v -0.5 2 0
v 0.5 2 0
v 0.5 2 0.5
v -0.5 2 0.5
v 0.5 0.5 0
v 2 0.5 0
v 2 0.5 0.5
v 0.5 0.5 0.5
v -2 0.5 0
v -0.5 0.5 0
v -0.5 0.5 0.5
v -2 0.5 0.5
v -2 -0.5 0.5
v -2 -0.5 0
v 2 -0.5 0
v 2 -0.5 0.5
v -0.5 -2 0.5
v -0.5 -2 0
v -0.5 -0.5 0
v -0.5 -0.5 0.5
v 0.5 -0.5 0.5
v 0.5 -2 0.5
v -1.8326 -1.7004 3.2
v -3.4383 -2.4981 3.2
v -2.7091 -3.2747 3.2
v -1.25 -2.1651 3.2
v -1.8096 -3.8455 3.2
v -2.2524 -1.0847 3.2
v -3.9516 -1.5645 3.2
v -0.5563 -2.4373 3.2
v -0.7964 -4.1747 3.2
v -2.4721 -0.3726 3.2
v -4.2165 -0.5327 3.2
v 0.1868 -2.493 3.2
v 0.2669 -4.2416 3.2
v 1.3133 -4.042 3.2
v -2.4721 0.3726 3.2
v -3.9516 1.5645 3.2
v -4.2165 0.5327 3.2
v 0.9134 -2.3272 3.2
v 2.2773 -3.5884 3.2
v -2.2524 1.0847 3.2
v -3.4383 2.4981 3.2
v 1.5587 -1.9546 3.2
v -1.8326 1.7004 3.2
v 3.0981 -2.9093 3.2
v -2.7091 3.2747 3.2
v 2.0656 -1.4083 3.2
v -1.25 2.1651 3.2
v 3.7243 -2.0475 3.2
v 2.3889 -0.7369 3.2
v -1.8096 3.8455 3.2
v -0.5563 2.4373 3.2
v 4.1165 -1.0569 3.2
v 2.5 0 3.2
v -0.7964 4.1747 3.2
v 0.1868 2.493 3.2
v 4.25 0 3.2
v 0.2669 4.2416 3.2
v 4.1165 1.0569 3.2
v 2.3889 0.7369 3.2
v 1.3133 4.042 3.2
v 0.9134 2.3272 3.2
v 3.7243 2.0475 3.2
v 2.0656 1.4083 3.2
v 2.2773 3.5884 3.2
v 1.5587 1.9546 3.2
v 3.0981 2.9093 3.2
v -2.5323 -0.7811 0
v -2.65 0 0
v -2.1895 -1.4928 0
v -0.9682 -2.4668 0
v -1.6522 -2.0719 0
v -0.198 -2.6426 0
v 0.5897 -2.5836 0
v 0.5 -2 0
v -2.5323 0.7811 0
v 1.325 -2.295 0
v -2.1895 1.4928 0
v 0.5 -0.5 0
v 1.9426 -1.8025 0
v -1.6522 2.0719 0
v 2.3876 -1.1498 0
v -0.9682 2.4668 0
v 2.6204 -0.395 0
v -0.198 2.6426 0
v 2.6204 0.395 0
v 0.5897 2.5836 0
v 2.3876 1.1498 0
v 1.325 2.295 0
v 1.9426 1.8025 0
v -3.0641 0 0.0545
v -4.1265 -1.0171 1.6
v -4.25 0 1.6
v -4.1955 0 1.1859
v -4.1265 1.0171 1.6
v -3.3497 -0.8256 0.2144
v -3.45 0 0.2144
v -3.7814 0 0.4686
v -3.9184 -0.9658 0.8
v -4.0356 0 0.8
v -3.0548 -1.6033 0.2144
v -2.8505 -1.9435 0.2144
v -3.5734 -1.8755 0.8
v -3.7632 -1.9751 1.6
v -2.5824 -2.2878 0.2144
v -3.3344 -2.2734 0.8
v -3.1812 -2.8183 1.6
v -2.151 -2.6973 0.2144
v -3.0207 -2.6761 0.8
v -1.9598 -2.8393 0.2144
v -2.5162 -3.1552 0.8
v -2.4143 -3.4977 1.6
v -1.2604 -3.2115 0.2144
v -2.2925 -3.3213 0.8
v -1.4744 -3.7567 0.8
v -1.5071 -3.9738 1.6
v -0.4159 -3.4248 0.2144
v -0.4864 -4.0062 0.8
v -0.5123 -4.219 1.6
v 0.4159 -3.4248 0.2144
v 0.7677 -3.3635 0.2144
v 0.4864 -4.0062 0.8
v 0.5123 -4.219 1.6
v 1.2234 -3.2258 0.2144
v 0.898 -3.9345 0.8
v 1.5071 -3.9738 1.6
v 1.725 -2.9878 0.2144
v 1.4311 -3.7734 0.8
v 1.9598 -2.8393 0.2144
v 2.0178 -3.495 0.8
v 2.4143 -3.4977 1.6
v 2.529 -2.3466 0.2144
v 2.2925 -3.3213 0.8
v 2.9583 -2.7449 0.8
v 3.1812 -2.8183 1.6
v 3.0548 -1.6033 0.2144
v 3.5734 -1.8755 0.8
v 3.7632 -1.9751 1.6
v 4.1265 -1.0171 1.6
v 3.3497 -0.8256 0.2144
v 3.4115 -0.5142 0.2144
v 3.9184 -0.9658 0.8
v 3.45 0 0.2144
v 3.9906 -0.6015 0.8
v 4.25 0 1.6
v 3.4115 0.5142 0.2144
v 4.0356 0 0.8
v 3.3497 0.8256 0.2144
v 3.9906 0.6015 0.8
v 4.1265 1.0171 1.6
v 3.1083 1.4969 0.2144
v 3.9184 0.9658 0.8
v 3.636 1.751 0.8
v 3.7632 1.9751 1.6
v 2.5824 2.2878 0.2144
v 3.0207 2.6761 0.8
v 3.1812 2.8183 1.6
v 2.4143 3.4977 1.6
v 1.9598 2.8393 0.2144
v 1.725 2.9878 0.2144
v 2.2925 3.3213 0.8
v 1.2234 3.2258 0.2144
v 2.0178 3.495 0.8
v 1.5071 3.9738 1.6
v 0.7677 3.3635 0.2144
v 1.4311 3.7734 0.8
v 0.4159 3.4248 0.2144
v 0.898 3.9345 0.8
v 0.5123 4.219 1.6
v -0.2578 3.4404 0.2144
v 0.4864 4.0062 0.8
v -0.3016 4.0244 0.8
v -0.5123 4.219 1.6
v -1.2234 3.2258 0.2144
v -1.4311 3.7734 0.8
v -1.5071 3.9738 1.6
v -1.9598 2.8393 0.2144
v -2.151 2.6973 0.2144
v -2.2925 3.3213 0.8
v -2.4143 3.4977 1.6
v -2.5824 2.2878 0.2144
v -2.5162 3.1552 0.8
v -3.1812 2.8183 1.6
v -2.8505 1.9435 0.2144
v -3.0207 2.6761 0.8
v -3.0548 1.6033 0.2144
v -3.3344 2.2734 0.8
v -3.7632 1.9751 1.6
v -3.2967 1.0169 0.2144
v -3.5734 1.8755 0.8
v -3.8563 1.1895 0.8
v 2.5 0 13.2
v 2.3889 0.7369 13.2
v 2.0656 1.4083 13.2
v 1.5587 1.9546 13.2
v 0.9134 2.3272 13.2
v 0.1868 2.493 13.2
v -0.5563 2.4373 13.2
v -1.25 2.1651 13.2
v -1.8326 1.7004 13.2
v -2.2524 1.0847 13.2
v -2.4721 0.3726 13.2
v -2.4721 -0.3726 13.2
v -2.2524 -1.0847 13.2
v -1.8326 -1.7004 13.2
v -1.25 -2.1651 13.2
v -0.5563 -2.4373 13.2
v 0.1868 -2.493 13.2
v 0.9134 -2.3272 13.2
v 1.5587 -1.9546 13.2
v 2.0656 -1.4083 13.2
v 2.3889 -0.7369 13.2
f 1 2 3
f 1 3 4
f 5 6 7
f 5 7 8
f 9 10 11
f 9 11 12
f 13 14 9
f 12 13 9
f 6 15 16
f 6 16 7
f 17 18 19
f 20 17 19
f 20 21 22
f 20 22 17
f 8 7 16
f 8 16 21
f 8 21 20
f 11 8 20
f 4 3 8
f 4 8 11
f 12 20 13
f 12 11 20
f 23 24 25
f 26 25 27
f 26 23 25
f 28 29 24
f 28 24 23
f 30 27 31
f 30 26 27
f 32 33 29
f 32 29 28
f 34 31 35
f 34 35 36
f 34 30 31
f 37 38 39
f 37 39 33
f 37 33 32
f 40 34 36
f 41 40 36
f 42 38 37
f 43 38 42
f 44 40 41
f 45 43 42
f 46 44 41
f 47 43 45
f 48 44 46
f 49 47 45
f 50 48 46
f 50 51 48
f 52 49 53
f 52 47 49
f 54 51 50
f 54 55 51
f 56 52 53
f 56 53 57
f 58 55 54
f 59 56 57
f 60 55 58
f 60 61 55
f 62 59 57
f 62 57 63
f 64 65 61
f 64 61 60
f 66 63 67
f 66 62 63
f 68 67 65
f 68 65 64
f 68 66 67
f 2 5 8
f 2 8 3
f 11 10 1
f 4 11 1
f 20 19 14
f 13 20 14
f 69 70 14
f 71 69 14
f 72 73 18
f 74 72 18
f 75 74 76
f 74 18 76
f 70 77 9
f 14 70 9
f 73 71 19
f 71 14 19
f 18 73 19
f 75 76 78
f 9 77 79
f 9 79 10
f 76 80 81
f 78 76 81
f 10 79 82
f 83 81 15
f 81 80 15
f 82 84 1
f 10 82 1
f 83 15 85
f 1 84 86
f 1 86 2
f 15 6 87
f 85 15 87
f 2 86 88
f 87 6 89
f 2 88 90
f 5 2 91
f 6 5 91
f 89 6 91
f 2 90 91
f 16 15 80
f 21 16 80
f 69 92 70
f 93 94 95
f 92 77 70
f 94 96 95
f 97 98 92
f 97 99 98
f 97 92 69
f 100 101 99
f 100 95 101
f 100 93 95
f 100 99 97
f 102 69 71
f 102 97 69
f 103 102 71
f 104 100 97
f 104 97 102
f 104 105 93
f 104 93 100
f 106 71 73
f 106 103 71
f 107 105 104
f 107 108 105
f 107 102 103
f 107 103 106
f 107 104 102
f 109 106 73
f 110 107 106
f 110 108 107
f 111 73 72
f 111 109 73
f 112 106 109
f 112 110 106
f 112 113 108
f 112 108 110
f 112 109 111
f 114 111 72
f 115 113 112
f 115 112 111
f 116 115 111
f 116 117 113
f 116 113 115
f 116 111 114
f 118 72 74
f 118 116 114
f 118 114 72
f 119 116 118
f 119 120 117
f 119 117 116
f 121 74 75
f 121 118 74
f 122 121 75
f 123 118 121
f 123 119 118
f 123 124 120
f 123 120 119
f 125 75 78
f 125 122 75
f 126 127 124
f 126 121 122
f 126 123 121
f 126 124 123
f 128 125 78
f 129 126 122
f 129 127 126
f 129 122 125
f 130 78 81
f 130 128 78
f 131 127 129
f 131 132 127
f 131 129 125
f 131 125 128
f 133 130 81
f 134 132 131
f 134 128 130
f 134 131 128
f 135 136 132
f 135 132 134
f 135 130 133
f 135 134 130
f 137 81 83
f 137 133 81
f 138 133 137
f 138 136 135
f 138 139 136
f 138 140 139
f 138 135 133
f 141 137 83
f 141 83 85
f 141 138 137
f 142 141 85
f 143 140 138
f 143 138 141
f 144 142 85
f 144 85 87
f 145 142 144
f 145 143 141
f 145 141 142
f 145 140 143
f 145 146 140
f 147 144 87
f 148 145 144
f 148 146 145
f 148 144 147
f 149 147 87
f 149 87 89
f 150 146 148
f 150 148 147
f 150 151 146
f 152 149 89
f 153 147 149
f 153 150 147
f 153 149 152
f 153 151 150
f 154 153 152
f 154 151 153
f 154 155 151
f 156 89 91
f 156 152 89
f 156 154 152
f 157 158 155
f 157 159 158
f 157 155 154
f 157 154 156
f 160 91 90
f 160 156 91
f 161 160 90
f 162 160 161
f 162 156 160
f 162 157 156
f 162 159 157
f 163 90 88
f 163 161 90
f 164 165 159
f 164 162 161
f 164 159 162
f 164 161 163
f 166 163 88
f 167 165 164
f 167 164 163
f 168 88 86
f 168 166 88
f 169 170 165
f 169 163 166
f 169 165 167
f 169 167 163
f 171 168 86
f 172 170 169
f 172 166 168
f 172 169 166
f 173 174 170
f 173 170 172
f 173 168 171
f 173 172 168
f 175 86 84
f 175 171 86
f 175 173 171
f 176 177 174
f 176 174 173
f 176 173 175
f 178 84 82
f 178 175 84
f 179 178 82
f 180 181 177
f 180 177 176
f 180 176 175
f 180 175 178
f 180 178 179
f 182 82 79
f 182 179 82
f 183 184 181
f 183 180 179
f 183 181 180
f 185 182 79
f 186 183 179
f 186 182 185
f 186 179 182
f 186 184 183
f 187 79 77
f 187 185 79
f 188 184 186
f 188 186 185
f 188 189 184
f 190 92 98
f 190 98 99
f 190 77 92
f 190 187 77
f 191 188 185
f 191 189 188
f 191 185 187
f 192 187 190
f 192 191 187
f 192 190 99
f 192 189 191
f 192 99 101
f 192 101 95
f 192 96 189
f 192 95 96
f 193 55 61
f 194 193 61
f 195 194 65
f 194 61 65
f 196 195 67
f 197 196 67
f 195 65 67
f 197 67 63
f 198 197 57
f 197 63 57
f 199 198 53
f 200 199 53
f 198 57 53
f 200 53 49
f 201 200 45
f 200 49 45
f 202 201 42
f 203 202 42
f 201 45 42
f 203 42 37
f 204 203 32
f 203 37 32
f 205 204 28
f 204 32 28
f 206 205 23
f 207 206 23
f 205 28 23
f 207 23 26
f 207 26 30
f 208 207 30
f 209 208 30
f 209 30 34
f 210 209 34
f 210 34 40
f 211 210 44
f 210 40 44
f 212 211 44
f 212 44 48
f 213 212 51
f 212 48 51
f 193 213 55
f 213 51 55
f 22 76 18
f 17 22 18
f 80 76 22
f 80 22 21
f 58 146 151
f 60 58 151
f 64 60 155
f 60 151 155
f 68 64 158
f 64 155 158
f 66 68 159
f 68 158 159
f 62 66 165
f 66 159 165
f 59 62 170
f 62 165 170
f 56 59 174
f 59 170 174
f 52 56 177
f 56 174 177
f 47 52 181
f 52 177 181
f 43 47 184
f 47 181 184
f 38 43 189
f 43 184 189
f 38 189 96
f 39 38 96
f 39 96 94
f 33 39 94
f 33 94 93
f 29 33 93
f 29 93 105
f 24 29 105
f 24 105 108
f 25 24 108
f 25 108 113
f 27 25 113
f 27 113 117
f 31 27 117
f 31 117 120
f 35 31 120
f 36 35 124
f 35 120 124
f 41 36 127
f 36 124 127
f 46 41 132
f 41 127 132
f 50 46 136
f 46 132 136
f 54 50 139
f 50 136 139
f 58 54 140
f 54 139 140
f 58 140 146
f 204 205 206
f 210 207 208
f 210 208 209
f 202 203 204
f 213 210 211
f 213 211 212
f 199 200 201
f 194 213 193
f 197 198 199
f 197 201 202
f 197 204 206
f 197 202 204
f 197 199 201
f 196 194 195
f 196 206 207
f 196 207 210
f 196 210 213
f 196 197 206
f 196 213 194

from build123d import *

# Parameters (mm, degrees)
SKETCH1_R           = 4.25
BOSS_EXTRUDE4_DEPTH = 3.2
SKETCH3_W           = 1
SKETCH3_H           = 4
SKETCH3_W_2         = 4
SKETCH3_H_2         = 1
CUT_EXTRUDE1_DEPTH  = 0.5
SKETCH4_R           = 2.5
BOSS_EXTRUDE7_DEPTH = 10


with BuildPart() as part:
    # Sketch1 → Boss-Extrude4 (new body)
    with BuildSketch(Plane.XY):
        Circle(SKETCH1_R)
    extrude(amount=BOSS_EXTRUDE4_DEPTH)

    # Sketch2 → Cut-Revolve1 (revolve, cut)
    with BuildSketch(Plane(origin=(0, 0, 0), x_dir=(1, 0, 0), z_dir=(0, 1, 0))):
        with BuildLine():
            Line((-4.25, -1.6), (-4.25, 0))
            Line((-4.25, 0), (-2.65, 0))
            ThreePointArc((-2.65, 0), (-3.78137085, -0.46862915), (-4.25, -1.6))
        make_face()
    revolve(axis=Axis((0, 0, 0), (0, 0, 1)), mode=Mode.SUBTRACT)

    # Sketch3 → Cut-Extrude1 (cut)
    with BuildSketch(Plane(origin=(0, 0, 0), x_dir=(-1, 0, 0), z_dir=(0, 0, -1))):
        Rectangle(SKETCH3_W, SKETCH3_H)
        Rectangle(SKETCH3_W_2, SKETCH3_H_2)
    extrude(amount=-CUT_EXTRUDE1_DEPTH, mode=Mode.SUBTRACT)

    # Sketch4 → Boss-Extrude7 (add)
    with BuildSketch(Plane.XY.offset(3.2)):
        Circle(SKETCH4_R)
    extrude(amount=BOSS_EXTRUDE7_DEPTH)


solid = part.part
